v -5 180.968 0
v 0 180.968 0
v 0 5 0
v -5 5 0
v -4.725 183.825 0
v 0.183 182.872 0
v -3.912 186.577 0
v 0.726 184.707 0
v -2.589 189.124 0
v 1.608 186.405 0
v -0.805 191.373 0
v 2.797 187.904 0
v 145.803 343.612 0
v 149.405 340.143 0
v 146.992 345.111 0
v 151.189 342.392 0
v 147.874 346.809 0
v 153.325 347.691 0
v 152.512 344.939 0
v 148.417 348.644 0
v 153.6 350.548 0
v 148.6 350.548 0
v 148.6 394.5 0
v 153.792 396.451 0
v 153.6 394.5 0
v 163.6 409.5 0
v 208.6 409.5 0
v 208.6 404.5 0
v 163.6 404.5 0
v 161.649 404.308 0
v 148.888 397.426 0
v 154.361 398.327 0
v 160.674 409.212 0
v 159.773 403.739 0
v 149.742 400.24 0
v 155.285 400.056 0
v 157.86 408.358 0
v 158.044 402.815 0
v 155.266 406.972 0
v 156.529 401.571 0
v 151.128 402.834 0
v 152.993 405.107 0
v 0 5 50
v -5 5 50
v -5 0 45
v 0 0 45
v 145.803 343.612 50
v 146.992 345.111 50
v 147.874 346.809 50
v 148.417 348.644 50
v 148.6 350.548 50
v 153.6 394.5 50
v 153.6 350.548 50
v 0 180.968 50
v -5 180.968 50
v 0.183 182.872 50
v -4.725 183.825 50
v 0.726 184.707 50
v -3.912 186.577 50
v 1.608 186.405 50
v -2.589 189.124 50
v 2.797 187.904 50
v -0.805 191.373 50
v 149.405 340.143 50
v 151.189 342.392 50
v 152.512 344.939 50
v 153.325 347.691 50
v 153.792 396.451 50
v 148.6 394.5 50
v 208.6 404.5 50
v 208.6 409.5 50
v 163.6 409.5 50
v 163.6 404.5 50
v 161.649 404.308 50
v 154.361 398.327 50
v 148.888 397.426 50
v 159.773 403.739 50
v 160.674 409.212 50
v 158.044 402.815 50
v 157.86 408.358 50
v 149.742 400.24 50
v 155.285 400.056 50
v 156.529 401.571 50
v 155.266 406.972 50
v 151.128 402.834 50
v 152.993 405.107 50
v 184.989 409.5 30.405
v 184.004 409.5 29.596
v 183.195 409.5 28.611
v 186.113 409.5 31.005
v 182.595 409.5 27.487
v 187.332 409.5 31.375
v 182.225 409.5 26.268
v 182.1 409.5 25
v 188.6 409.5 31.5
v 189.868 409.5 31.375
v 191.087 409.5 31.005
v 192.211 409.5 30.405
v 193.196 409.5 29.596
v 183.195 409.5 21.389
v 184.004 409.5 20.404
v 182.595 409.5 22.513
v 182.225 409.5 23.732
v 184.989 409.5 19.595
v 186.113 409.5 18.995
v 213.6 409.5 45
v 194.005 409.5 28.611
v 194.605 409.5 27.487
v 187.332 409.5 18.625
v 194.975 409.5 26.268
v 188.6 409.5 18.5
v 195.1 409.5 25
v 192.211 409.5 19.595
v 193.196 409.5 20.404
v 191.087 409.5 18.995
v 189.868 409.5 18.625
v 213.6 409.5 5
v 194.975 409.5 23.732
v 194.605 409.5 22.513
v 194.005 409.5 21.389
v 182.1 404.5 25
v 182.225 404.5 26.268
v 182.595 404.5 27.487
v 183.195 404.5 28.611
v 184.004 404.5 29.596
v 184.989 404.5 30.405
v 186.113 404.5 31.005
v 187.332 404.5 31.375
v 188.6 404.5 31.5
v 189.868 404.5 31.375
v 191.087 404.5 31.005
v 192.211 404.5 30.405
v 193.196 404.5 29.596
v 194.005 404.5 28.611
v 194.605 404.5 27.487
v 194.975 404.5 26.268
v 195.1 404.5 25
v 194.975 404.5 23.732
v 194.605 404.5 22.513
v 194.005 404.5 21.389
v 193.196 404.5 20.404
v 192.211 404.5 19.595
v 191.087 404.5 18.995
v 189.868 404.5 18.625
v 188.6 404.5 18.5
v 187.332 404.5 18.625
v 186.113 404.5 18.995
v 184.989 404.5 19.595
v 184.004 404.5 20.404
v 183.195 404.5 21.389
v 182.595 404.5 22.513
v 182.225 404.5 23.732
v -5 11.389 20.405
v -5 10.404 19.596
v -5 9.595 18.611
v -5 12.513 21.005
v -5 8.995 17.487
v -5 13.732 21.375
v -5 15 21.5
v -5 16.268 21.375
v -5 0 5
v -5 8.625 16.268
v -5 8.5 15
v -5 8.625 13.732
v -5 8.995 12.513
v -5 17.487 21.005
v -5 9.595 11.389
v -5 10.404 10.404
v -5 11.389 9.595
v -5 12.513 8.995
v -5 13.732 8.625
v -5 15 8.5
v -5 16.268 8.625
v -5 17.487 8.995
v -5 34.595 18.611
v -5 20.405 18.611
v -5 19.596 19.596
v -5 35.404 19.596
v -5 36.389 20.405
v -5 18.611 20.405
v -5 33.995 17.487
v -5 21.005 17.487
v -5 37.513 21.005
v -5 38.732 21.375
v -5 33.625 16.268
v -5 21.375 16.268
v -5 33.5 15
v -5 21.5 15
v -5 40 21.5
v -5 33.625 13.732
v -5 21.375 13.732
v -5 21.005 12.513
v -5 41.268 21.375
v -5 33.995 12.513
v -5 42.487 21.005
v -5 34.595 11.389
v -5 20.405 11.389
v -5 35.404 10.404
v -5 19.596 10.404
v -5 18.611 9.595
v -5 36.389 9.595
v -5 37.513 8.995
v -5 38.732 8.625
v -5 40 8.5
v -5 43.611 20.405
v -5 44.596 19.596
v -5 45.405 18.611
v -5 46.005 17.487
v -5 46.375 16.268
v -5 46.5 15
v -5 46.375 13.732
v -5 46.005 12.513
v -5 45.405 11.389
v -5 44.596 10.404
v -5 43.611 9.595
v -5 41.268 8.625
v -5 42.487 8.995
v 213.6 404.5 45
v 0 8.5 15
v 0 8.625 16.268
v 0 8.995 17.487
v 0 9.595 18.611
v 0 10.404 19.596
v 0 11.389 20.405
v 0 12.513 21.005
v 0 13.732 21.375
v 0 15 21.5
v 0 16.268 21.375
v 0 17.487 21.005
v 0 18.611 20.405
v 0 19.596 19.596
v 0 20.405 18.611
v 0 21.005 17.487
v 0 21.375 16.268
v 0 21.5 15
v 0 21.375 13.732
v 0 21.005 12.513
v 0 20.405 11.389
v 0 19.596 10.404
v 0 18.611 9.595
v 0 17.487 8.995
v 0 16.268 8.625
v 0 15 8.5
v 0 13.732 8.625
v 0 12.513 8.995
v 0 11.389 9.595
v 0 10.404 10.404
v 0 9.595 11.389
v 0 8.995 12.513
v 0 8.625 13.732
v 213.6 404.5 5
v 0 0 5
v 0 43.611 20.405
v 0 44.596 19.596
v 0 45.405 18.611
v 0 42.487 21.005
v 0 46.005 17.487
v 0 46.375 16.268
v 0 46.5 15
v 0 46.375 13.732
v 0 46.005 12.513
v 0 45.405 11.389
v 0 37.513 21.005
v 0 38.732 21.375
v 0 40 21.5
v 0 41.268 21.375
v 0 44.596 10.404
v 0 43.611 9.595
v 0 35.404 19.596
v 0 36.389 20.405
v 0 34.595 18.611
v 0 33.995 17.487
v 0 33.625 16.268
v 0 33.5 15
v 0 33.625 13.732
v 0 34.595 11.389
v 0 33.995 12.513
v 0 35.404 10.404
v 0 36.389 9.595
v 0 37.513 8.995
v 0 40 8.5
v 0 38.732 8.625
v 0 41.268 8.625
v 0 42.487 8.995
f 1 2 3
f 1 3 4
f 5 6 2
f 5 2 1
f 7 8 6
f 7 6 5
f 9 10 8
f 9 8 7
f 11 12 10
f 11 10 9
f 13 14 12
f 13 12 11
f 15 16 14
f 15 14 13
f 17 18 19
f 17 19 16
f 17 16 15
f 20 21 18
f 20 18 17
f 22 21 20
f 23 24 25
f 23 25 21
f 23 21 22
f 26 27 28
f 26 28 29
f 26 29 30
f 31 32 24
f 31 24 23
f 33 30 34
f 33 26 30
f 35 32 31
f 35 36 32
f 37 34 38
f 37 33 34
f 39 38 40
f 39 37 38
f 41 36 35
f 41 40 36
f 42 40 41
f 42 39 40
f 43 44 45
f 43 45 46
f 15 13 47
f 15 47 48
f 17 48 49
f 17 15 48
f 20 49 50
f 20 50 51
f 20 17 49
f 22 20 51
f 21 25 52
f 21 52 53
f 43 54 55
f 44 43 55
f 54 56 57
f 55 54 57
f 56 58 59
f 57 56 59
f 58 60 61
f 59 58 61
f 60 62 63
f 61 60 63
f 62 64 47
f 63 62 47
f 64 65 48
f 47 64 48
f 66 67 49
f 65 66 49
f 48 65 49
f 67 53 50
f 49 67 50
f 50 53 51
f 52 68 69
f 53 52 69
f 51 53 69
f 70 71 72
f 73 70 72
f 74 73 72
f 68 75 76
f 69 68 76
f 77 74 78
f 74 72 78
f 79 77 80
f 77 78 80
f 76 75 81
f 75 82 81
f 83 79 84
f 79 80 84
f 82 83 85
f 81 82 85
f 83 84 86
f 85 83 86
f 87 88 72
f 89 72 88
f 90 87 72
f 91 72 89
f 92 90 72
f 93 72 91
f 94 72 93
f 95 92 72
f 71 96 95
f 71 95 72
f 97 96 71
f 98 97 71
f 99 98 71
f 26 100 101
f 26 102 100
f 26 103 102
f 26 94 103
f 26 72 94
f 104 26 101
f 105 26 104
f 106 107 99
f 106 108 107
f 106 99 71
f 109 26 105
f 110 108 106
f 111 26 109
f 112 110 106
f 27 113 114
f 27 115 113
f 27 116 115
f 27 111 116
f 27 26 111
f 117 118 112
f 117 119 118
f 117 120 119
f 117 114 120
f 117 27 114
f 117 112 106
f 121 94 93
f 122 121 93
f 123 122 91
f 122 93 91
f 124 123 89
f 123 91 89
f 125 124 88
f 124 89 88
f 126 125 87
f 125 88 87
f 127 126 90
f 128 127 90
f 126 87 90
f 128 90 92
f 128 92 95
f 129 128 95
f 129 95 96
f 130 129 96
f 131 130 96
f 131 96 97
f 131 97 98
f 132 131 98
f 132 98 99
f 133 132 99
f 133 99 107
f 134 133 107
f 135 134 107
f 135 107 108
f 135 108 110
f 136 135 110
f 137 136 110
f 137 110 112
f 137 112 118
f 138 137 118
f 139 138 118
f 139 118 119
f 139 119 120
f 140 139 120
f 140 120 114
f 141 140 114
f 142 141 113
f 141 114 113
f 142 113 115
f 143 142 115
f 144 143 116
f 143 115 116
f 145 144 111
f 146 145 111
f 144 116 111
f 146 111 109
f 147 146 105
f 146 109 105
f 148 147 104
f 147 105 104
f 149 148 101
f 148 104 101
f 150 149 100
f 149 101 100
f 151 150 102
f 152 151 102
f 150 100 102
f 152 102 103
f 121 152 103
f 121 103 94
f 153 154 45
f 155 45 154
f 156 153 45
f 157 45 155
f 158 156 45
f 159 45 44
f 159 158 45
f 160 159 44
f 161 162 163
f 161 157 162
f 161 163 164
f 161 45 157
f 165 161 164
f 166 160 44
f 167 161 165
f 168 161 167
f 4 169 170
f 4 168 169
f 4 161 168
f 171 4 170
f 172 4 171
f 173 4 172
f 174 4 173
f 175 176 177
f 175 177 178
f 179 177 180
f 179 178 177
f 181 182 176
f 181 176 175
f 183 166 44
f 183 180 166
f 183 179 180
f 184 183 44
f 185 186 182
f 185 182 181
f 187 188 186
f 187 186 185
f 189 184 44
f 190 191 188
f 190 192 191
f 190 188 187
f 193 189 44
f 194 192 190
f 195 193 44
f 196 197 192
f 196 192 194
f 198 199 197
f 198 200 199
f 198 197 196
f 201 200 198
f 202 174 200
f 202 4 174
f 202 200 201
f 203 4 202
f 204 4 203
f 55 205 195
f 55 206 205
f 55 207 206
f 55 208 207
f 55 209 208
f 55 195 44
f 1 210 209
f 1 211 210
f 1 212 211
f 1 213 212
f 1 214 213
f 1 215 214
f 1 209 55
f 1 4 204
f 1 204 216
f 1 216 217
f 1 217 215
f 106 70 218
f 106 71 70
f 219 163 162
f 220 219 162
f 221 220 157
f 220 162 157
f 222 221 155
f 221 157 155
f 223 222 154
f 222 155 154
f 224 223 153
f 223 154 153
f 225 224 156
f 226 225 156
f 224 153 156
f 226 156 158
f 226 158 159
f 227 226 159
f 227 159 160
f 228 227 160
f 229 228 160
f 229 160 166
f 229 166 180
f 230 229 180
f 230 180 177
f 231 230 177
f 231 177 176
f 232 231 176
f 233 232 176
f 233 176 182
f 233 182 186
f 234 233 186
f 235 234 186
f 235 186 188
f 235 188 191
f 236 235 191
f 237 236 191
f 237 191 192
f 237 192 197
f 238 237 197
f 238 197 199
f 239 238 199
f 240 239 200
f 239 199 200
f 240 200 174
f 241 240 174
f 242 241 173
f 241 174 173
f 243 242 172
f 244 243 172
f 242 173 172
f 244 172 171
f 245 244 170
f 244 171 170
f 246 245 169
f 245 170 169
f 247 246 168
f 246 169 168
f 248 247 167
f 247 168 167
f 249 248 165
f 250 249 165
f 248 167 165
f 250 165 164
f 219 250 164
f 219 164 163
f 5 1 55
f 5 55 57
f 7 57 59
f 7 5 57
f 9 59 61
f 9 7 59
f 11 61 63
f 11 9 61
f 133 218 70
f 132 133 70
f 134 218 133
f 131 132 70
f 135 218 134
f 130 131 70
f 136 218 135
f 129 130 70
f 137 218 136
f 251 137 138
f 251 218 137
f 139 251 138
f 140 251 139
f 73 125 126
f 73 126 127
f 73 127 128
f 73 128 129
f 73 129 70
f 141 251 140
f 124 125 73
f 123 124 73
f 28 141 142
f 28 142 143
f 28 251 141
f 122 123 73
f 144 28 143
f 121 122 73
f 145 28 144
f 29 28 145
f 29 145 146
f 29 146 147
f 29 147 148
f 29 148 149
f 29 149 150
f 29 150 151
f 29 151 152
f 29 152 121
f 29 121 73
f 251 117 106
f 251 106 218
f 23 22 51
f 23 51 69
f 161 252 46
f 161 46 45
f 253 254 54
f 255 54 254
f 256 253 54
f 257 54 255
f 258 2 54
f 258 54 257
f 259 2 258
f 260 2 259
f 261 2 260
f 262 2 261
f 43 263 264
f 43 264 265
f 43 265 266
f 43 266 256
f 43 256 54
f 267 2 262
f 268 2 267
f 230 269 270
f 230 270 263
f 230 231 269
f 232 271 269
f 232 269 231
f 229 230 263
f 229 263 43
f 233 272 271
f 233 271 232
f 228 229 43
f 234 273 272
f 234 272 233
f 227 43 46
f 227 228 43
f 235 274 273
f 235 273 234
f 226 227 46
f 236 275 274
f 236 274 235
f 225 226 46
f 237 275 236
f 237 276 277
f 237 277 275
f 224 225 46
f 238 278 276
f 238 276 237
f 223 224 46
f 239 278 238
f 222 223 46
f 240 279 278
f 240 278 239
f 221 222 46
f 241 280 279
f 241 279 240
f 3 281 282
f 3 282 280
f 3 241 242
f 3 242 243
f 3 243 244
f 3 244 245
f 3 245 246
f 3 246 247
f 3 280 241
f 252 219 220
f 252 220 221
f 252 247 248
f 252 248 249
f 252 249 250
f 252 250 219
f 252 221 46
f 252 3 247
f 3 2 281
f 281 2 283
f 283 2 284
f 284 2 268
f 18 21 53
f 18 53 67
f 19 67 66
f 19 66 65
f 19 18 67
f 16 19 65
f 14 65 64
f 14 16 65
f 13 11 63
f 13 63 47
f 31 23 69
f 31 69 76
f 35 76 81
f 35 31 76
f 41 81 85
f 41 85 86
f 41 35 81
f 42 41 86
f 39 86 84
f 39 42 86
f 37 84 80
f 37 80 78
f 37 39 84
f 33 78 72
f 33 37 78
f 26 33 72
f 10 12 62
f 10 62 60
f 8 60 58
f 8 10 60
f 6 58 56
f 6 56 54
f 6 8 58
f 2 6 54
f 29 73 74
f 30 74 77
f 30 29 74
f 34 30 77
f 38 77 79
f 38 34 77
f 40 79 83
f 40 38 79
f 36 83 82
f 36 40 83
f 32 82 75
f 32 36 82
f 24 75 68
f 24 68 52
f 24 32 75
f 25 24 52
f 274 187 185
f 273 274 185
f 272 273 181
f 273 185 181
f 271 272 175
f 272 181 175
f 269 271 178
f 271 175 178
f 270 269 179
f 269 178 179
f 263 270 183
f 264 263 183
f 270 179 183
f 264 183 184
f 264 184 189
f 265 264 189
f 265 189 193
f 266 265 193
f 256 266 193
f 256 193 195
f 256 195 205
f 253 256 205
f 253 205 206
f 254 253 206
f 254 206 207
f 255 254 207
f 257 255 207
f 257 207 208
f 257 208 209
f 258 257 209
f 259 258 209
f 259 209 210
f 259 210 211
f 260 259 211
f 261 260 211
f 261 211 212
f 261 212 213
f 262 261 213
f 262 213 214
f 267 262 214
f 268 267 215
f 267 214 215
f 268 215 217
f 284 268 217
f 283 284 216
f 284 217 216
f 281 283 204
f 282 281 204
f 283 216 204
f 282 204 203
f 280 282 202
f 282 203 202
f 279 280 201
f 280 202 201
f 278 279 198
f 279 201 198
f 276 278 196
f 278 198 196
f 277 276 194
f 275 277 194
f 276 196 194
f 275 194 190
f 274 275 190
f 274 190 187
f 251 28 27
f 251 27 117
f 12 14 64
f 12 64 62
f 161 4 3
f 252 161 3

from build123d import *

# Parameters (mm, degrees)
SM_BASE_FLANGE_1_DEPTH = 50
SKETCH_6_R             = 6.5
CUT_EXTRUDE_1_DEPTH    = 10
SKETCH_7_R             = 6.5
CUT_EXTRUDE_2_DEPTH    = 10
OTHER_START            = 147.502474556
OTHER_1_OUTLINE_W      = 10
OTHER_1_OUTLINE_H      = 8
OTHER_1_DEPTH          = 3.535533905
OTHER_START_2          = 182.857813615
OTHER_1_2_OUTLINE_W    = 38
OTHER_1_2_OUTLINE_H    = 8
OTHER_1_2_DEPTH        = 3.535533906
OTHER_1_3_OUTLINE_W    = 7
OTHER_1_3_OUTLINE_H    = 10
OTHER_1_3_DEPTH        = 3.535533906
OTHER_START_3          = -35.355339059
OTHER_1_4_OUTLINE_W    = 7
OTHER_1_4_OUTLINE_H    = 38
OTHER_1_4_DEPTH        = 3.535533906


# Read off the part's stored shape, not the designer's step: Затупленный угол1
# Sheet-metal steps are written as plain solids
with BuildPart() as part:
    # Sketch 1 → Базовая кромка1 (new body)
    with BuildSketch(Plane.XY):
        with BuildLine():
            Line((213.6, 404.5), (163.6, 404.5))
            ThreePointArc((163.6, 404.5), (156.528932188, 401.571067812), (153.6, 394.5))
            Line((153.6, 394.5), (153.6, 350.548284888))
            ThreePointArc((153.6, 350.548284888), (152.511654958, 344.938841391), (149.404552488, 340.143399231))
            Line((149.404552488, 340.143399231), (2.796965008, 187.904400513))
            ThreePointArc((2.796965008, 187.904400513), (0.725563362, 184.707439072), (0, 180.967810075))
            Line((0, 180.967810075), (0, 0))
            Line((0, 0), (-5, 0))
            Line((-5, 0), (-5, 180.967810075))
            ThreePointArc((-5, 180.967810075), (-3.911654958, 186.577253571), (-0.804552488, 191.372695731))
            Line((-0.804552488, 191.372695731), (145.803034992, 343.61169445))
            ThreePointArc((145.803034992, 343.61169445), (147.874436638, 346.80865589), (148.6, 350.548284888))
            Line((148.6, 350.548284888), (148.6, 394.5))
            ThreePointArc((148.6, 394.5), (152.993398282, 405.106601718), (163.6, 409.5))
            Line((163.6, 409.5), (213.6, 409.5))
            Line((213.6, 409.5), (213.6, 404.5))
        make_face()
    extrude(amount=SM_BASE_FLANGE_1_DEPTH)

    # Эскиз6 → Вырез-Вытянуть1 (cut)
    with BuildSketch(Plane.ZY.offset(5)):
        with Locations(Location((15, 15, 0), (0, 0, 270))):
            Circle(SKETCH_6_R)
        with Locations(Location((15, 40, 0), (0, 0, 270))):
            Circle(SKETCH_6_R)
    extrude(amount=-CUT_EXTRUDE_1_DEPTH, mode=Mode.SUBTRACT)

    # Эскиз7 → Вырез-Вытянуть2 (cut)
    with BuildSketch(Plane(origin=(0, 409.5, 0), x_dir=(1, 0, 0), z_dir=(0, 1, 0))):
        with Locations(Location((188.6, -25, 0), (0, 0, 180))):
            Circle(SKETCH_7_R)
    extrude(amount=-CUT_EXTRUDE_2_DEPTH, mode=Mode.SUBTRACT)

    # Other 1 outline → Other 1 (cut)
    with BuildSketch(Plane(origin=(0, 0, 0), x_dir=(0.707106781186548, 0, 0.707106781186547), z_dir=(0.707106781186547, 0, -0.707106781186548)).offset(OTHER_START)):
        with Locations((151, -407)):
            Rectangle(OTHER_1_OUTLINE_W, OTHER_1_OUTLINE_H)
    extrude(amount=OTHER_1_DEPTH, mode=Mode.SUBTRACT)

    # Other 1 2 outline → Other 1 2 (cut)
    with BuildSketch(Plane(origin=(0, 0, 0), x_dir=(0.707106781186548, 0, -0.707106781186547), z_dir=(0.707106781186547, 0, 0.707106781186548)).offset(OTHER_START_2)):
        with Locations((130, 407)):
            Rectangle(OTHER_1_2_OUTLINE_W, OTHER_1_2_OUTLINE_H)
    extrude(amount=OTHER_1_2_DEPTH, mode=Mode.SUBTRACT)

    # Other 1 3 outline → Other 1 3 (cut)
    with BuildSketch(Plane(origin=(0, 0, 0), x_dir=(1, 0, 0), z_dir=(0, 0.707106781186547, 0.707106781186548))):
        with Locations((-2.5, 0)):
            Rectangle(OTHER_1_3_OUTLINE_W, OTHER_1_3_OUTLINE_H)
    extrude(amount=OTHER_1_3_DEPTH, mode=Mode.SUBTRACT)

    # Other 1 4 outline → Other 1 4 (cut)
    with BuildSketch(Plane(origin=(0, 0, 0), x_dir=(1, 0, 0), z_dir=(0, 0.707106781186547, -0.707106781186548)).offset(OTHER_START_3)):
        with Locations((-2.5, -21)):
            Rectangle(OTHER_1_4_OUTLINE_W, OTHER_1_4_OUTLINE_H)
    extrude(amount=OTHER_1_4_DEPTH, mode=Mode.SUBTRACT)


solid = part.part
